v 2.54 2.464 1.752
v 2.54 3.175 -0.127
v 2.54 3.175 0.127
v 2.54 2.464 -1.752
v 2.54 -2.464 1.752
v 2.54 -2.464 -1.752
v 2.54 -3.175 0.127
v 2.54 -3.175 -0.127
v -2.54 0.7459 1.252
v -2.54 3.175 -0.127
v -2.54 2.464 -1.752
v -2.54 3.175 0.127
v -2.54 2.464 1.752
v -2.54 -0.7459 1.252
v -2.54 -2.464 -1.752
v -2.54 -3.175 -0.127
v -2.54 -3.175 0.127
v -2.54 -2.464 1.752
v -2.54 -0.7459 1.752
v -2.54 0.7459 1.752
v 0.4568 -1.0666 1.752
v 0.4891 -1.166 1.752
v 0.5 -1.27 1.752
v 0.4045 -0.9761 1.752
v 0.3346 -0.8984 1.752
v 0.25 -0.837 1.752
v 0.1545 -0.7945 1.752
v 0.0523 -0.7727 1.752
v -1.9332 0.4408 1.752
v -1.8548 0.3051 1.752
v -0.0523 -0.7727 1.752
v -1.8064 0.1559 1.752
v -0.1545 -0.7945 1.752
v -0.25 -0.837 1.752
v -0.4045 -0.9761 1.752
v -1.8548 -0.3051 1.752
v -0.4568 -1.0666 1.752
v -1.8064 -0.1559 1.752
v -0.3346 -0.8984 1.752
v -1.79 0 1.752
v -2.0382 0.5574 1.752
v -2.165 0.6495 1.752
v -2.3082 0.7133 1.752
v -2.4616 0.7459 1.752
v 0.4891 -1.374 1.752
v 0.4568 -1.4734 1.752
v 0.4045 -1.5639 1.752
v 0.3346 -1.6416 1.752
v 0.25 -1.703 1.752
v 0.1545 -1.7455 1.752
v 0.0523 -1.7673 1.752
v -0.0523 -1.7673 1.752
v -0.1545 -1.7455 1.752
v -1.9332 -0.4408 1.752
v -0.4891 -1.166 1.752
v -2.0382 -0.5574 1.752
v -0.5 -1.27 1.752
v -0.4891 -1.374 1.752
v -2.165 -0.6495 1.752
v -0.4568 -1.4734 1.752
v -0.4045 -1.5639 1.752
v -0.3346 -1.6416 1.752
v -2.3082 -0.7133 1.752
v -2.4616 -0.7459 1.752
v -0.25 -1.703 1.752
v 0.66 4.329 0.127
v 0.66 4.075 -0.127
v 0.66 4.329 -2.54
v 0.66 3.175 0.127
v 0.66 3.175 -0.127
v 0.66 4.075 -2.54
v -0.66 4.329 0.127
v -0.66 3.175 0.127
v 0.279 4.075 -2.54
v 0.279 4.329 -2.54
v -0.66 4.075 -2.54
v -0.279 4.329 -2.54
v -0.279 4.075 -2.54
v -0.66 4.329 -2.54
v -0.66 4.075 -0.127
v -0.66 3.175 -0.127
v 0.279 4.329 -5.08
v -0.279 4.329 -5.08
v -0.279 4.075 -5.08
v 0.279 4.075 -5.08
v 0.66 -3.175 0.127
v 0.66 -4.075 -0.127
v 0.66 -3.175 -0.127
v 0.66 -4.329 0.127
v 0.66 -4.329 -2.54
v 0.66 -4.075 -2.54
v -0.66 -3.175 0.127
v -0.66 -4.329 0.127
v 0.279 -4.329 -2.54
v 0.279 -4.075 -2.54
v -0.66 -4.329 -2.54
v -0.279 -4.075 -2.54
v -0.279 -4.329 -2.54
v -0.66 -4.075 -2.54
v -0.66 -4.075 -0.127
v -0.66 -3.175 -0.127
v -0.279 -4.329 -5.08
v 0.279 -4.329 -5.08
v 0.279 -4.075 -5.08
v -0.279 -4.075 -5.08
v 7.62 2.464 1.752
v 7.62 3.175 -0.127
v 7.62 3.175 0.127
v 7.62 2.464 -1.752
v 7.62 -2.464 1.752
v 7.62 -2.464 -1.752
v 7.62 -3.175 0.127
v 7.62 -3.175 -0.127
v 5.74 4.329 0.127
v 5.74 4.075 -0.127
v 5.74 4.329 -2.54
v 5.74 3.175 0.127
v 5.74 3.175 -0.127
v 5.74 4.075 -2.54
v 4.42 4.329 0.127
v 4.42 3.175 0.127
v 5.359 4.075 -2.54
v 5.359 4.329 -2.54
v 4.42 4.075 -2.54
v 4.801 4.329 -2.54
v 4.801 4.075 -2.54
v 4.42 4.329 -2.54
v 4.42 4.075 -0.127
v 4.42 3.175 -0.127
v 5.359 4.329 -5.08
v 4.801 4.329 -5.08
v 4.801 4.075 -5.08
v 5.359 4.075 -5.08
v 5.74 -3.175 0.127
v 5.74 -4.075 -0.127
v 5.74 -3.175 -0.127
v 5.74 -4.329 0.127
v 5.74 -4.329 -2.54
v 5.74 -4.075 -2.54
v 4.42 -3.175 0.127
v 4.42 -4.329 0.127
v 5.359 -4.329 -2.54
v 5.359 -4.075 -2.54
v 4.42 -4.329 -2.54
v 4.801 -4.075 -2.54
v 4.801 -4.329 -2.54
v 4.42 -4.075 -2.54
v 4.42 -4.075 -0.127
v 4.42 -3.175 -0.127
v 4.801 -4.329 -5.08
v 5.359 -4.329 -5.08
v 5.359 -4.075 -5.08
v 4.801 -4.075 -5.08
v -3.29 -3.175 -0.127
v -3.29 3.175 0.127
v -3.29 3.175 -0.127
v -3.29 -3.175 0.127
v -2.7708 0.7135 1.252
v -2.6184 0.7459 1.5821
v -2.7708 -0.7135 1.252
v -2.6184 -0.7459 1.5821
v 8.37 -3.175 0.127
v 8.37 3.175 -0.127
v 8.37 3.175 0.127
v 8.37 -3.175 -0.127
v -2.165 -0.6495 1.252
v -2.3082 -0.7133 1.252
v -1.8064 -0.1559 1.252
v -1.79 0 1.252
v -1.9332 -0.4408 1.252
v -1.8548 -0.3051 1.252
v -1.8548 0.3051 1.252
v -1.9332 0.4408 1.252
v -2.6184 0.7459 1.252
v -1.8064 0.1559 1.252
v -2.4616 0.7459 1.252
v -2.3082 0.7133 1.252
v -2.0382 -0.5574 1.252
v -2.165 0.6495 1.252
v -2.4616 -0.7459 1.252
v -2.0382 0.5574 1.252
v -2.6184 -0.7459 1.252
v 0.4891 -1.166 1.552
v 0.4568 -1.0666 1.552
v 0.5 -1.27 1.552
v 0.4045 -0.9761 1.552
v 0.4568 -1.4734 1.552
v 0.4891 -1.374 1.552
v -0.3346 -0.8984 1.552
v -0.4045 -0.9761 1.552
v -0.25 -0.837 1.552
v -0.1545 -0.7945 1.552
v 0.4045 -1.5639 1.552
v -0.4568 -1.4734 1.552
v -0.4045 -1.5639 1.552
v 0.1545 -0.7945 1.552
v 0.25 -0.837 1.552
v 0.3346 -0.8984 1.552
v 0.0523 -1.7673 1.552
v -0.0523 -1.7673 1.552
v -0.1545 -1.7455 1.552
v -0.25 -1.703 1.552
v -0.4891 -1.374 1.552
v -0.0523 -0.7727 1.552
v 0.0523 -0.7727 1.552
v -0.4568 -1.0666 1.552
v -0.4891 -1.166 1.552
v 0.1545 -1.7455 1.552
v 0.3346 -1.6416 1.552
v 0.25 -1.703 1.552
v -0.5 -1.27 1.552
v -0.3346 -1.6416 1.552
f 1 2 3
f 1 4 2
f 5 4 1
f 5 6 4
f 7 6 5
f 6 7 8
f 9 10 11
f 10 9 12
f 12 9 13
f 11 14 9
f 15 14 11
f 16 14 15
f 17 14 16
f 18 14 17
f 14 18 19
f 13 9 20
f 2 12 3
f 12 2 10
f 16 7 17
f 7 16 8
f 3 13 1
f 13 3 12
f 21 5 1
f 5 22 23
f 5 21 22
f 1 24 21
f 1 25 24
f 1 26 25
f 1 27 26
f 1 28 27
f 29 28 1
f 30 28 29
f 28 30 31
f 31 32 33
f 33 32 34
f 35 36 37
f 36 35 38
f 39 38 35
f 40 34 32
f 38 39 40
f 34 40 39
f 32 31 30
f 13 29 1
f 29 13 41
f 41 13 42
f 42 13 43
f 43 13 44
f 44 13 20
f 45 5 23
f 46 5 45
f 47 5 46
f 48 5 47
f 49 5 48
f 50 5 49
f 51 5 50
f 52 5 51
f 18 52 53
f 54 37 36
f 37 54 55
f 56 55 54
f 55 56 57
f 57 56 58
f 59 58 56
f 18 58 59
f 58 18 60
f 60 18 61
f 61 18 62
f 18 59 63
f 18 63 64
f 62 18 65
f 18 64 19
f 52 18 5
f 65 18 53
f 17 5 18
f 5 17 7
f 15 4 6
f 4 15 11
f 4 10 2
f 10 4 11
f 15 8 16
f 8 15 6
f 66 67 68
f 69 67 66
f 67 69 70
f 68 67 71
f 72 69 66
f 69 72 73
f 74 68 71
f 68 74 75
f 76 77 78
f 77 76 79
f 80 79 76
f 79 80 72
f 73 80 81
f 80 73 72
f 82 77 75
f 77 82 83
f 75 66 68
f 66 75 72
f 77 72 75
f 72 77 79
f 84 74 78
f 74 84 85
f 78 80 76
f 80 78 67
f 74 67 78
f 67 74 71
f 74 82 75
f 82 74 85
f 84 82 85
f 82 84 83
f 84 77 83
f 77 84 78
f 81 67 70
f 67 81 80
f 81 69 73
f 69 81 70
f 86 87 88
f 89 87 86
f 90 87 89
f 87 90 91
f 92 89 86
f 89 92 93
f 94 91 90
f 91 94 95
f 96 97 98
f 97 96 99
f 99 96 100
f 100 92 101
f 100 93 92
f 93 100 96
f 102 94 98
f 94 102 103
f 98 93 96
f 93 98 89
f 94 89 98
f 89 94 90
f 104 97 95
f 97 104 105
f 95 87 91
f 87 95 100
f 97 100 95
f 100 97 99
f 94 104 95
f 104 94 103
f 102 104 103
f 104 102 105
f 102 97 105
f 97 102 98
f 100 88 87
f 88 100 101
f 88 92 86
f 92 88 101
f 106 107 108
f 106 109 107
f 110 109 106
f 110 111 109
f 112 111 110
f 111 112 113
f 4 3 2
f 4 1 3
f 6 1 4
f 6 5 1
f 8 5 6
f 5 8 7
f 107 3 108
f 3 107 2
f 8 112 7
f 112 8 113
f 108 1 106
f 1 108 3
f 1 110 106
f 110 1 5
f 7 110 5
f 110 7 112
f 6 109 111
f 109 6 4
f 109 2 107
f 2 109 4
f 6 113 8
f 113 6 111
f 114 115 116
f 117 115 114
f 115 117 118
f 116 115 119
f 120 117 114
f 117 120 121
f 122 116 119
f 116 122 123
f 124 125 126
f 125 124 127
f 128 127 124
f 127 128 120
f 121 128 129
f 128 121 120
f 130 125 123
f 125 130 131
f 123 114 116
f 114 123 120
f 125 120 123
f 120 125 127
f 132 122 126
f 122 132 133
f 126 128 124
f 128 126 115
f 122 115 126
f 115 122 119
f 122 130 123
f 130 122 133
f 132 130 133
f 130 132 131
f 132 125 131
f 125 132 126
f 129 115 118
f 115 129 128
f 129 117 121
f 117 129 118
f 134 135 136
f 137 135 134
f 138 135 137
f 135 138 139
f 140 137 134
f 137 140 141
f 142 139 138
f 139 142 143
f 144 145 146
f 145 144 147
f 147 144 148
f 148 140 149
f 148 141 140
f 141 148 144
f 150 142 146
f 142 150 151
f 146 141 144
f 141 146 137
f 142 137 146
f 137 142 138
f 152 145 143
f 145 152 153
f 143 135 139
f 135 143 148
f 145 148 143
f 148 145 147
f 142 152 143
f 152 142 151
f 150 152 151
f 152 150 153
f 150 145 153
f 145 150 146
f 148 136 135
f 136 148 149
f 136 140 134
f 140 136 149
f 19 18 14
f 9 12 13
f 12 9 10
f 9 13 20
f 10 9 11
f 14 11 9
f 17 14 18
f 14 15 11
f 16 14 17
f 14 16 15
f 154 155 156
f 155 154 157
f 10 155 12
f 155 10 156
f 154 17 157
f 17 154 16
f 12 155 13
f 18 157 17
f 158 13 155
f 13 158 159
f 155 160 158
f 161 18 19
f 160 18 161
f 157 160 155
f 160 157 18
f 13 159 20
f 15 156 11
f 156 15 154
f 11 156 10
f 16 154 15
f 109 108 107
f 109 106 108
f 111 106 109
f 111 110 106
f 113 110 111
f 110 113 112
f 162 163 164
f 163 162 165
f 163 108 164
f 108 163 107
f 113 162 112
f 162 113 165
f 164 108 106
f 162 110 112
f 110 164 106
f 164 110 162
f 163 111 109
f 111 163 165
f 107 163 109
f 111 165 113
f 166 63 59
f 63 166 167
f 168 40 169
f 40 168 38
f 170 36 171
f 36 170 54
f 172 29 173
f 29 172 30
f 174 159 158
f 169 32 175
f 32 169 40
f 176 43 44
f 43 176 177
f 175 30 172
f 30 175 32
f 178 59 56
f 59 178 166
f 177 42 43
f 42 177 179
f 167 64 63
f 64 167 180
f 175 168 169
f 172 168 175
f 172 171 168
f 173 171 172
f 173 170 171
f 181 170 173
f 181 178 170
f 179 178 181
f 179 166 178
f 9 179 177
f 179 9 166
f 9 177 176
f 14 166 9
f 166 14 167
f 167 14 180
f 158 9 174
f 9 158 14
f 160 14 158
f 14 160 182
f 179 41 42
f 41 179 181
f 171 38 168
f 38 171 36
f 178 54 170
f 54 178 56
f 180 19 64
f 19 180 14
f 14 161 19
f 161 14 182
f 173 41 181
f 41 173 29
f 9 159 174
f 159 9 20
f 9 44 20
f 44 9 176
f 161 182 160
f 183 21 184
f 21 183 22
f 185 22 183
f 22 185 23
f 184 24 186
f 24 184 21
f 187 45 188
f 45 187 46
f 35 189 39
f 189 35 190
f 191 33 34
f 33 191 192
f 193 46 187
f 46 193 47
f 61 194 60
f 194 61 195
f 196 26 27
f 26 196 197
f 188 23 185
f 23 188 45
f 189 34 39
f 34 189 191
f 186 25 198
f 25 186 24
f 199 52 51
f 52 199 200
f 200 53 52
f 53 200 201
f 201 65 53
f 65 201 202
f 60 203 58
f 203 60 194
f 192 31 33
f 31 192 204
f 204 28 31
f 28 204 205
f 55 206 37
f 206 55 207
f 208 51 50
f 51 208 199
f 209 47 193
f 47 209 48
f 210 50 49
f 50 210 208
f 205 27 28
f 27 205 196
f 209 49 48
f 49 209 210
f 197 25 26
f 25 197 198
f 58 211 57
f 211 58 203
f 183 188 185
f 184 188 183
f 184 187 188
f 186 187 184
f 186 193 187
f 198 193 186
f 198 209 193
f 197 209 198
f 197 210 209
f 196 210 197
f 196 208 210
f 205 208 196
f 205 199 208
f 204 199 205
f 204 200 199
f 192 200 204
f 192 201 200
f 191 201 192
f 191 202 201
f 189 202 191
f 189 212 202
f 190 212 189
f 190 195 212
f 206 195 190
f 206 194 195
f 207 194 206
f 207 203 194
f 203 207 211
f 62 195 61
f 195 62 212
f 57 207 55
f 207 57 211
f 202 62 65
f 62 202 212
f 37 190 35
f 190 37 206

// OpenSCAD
// DIP Package Integrated Circuit
// 2017-11-03
// Mike Zemba

// Parametrically generates a Dual In-line Package (DIP)
// integrated circuit (IC).

// ----------
// PARAMETERS
// ----------

    nPinsIn = 4;
    
    icw  = 6.35; // Package - Width (Middle Section)
    ich1 = 0.254; // Package - Middle Section Height
    ich2 = 1.625; // Package - Top Section Height
    ich3 = 1.625; // Package - Bottom Section Height
    icec = 0.75;  // Package - End Cap Depth
    t1   = 0.711; // Package - Taper (Top)
    t2   = 0.711; // Package - Taper (Bottom)

    pitch = 5.08; // Pin Pitch

    pinw1 = 0.558; // Pin - Lower Section Width
    pinw2 = 1.320; // Pin - Upper Section Width
    pinh2 = 2.667; // Pin - Upper Section Height
    pinh1 = 2.540; // Pin - Lower Section Height
    pino  = 0.9; // Pin - Offset from Package
    pint  = 0.254; // Pin - Thickness
    
    nh = 0.5; // Notch Depth
    nd = 1.5; // Notch Diameter
    
    hh = 0.2; // Hole Depth
    hd = 1;   // Hole Diameter

// Round Up # Pins If Odd (Must Be Even)
nPins = 2*ceil(nPinsIn/2);

difference(){
    union(){
        for (i=[0:1:nPins/2-1])
            translate([pitch*i,0,0])
                ic_unit();
        translate([-pitch/2-icec/2,0,0])
            ic_end(icec,icw,t1,t2,ich1,ich2,ich3);
        translate([pitch/2+pitch*(nPins/2-1)+icec/2,0,0])
            mirror([1,0,0])
                ic_end(icec,icw,t1,t2,ich1,ich2,ich3);
    }
    union(){
        translate([-pitch/2,0,ich2+ich1/2-nh])
            color("DimGray") cylinder(d=nd,h=nh+1,$fn=30);
        translate([0,-icw/5,ich2+ich1/2-hh])
            color("DimGray") cylinder(d=hd,h=hh+1,$fn=30);
    }
}

module ic_unit(){
    ic_body(pitch,icw,t1,t2,ich1,ich2,ich3);
    translate([0,icw/2+pint/2+pino,pint/2])
        pin(pinw1,pinw2,pinh1,pinh2,pint,pino);
    translate([0,-icw/2-pint/2-pino,pint/2])
        mirror([0,1,0])
            pin(pinw1,pinw2,pinh1,pinh2,pint,pino);
}

module ic_end(pitch,icw,t1,t2,ich1,ich2,ich3){
    // Top Polyhedron Points
    endTopPoints = [
    [pitch/2, icw/2, ich1/2],             // 0   +x +y
    [-pitch/2, icw/2, ich1/2],            // 1   -x +y
    [pitch/2, -icw/2, ich1/2],            // 2   +x -y
    [-pitch/2, -icw/2, ich1/2],           // 3   -x -y
    [pitch/2, icw/2-t1, ich1/2+ich2],     // 4   +x +y
    //[-pitch/2, icw/2-t1, ich1/2+ich2],    // 5   -x +y
    [pitch/2, -icw/2+t1, ich1/2+ich2]];    // 6   +x -y
    //[-pitch/2, -icw/2+t1, ich1/2+ich2]];  // 7   -x -y

    // Bottom Polyhedron Points
    endBotPoints = [
    [pitch/2, icw/2, -ich1/2],            // 0   +x +y
    [-pitch/2, icw/2, -ich1/2],           // 1   -x +y
    [pitch/2, -icw/2, -ich1/2],           // 2   +x -y
    [-pitch/2, -icw/2, -ich1/2],          // 3   -x -y
    [pitch/2, icw/2-t2, -ich1/2-ich3],    // 4   +x +y
    //[-pitch/2, icw/2-t2, -ich1/2-ich3],   // 5   -x +y
    [pitch/2, -icw/2+t2, -ich1/2-ich3]];   // 6   +x -y
    //[-pitch/2, -icw/2+t2, -ich1/2-ich3]]; // 7   -x -y

    endTopFaces = [
      [2,0,1,3],  // bottom
      [5,4,0,2],  // front
      [3,1,4,5],  // top
      [4,1,0],  // right
      [5,2,3]]; // left
      
    endBotFaces = [
      [2,0,1,3],  // bottom
      [5,4,0,2],  // front
      [3,1,4,5],  // top
      [4,1,0],  // right
      [5,2,3]]; // left

    color("DimGray") cube([pitch,icw,ich1],center=true);
    color("DimGray") polyhedron(endTopPoints,endTopFaces);
    color("DimGray") polyhedron(endBotPoints,endBotFaces);
}

module ic_body(pitch,icw,t1,t2,ich1,ich2,ich3){
    // Top Polyhedron Points
    topPoints = [
    [pitch/2, icw/2, ich1/2],             // 0   +x +y
    [-pitch/2, icw/2, ich1/2],            // 1   -x +y
    [pitch/2, -icw/2, ich1/2],            // 2   +x -y
    [-pitch/2, -icw/2, ich1/2],           // 3   -x -y
    [pitch/2, icw/2-t1, ich1/2+ich2],     // 4   +x +y
    [-pitch/2, icw/2-t1, ich1/2+ich2],    // 5   -x +y
    [pitch/2, -icw/2+t1, ich1/2+ich2],    // 6   +x -y
    [-pitch/2, -icw/2+t1, ich1/2+ich2]];  // 7   -x -y

    // Bottom Polyhedron Points
    botPoints = [
    [pitch/2, icw/2, -ich1/2],            // 0   +x +y
    [-pitch/2, icw/2, -ich1/2],           // 1   -x +y
    [pitch/2, -icw/2, -ich1/2],           // 2   +x -y
    [-pitch/2, -icw/2, -ich1/2],          // 3   -x -y
    [pitch/2, icw/2-t2, -ich1/2-ich3],    // 4   +x +y
    [-pitch/2, icw/2-t2, -ich1/2-ich3],   // 5   -x +y
    [pitch/2, -icw/2+t2, -ich1/2-ich3],   // 6   +x -y
    [-pitch/2, -icw/2+t2, -ich1/2-ich3]]; // 7   -x -y

    topFaces = [
      [2,0,1,3],  // bottom
      [6,4,0,2],  // front
      [7,5,4,6],  // top
      [4,5,1,0],  // right
      [5,7,3,1],  // back
      [7,6,2,3]]; // left
      
    botFaces = [
      [2,0,1,3],  // bottom
      [6,4,0,2],  // front
      [7,5,4,6],  // top
      [4,5,1,0],  // right
      [5,7,3,1],  // back
      [7,6,2,3]]; // left

    color("DimGray") cube([pitch,icw,ich1],center=true);
    color("DimGray") polyhedron(topPoints,topFaces);
    color("DimGray") polyhedron(botPoints,botFaces);
}

module pin(pinw1,pinw2,pinh1,pinh2,pint,pino) {
    translate([-pinw2/2,-pint/2,-pinh2])
        color("Silver") cube([pinw2,pint,pinh2],center=false);
    translate([-pinw1/2,-pint/2,-pinh2-pinh1])
        color("Silver") cube([pinw1,pint,pinh1],center=false);
    translate([-pinw2/2,-pint/2-pino,-pint])  
        color("Silver") cube([pinw2,pino,pint]);
}

//translate([0,0,pinh1/2+pinh2/2])
//    cube([pinw2,pint,pinh2],center=true);
